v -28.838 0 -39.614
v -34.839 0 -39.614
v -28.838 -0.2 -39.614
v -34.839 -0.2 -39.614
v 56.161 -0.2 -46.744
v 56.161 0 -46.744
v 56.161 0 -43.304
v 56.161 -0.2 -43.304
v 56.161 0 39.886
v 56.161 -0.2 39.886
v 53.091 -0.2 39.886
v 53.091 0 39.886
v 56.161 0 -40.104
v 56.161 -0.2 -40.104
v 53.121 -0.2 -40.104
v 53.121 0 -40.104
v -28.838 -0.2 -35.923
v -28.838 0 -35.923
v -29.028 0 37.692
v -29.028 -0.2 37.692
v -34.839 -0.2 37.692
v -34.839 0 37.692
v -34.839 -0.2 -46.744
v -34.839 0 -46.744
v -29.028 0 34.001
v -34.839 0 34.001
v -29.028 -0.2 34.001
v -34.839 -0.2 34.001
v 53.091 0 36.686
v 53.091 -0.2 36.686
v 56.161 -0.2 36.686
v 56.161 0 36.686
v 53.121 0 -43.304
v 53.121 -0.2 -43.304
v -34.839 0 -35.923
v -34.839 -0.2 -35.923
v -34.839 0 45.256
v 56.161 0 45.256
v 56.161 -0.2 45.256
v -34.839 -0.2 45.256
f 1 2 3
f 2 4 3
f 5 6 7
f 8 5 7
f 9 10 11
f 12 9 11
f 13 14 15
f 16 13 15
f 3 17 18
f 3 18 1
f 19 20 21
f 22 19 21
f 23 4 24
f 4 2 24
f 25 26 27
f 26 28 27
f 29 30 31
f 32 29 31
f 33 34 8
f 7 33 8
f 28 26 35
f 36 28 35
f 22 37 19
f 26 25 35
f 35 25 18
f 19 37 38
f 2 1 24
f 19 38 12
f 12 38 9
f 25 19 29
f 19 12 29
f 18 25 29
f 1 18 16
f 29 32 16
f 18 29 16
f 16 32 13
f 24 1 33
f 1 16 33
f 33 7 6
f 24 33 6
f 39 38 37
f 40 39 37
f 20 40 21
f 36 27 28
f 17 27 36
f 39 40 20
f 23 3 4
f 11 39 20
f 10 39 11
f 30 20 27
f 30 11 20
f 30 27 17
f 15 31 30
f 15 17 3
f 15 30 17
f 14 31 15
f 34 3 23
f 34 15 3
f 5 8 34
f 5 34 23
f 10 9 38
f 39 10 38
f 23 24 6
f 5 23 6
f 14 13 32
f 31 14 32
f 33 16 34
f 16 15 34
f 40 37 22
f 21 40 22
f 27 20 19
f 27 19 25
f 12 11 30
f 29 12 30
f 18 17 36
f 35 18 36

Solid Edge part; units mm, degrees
sketch "Sketch1" plane through (12.1606, 0, 0.2565) normal (0, -1, 0) x (1, 0, 0)
  line L0 (-47, -47) -> (44, -47)
  line L1 (44, -47) -> (44, 45)
  line L2 (44, 45) -> (-47, 45)
  line L3 (-47, 45) -> (-47, -47)
  dimension "D1" = 91
  dimension "D2" = 92
extrude "ExtrudedProtrusion_1" add sketch "Sketch1" along normal blind 0.2
sketch "Sketch2" plane through (0, -0.2, 0) normal (0, -1, 0) x (1, 0, 0)
  circle A0 centre (-30.7894, -37.7535) radius 1.59
  circle A1 centre (54.6906, 38.2865) radius 1.59
  circle A2 centre (54.7206, -41.7035) radius 1.59
  circle A3 centre (-31.0894, 35.8465) radius 1.59
  dimension "D1" = 3.18
  dimension "D2" = 3.18
extrude "Cutout1" cut sketch "Sketch2" against normal up to next
sketch "Sketch3" plane through (10.6606, 0, -0.7435) normal (0, 1, 0) x (0, 0, 1)
  line L0 (-41.56, 42.46) -> (-42.56, 42.46)
  line L1 (-42.56, 42.46) -> (-42.56, 45.66)
  line L2 (-42.56, 45.66) -> (-39.36, 45.66)
  line L3 (-39.36, 45.66) -> (-39.36, 42.46)
  line L4 (-39.36, 42.46) -> (-41.56, 42.46)
extrude "ExtrudedCutout_2" cut sketch "Sketch3" along normal mid plane 12.4682
sketch "Sketch4" plane through (10.6606, 0, -0.7435) normal (0, 1, 0) x (0, 0, 1)
  line L0 (38.43, 42.43) -> (37.43, 42.43)
  line L1 (37.43, 42.43) -> (37.43, 45.63)
  line L2 (37.43, 45.63) -> (40.63, 45.63)
  line L3 (40.63, 45.63) -> (40.63, 42.43)
  line L4 (40.63, 42.43) -> (38.43, 42.43)
extrude "ExtrudedCutout_3" cut sketch "Sketch4" along normal mid plane 17.7174
sketch "Sketch5" plane through (10.6606, 0, -0.7435) normal (0, 1, 0) x (0, 0, -1)
  line L0 (-38.4354, 39.6883) -> (-38.4354, 46.3085)
  line L1 (-38.4354, 46.3085) -> (-34.7446, 46.3085)
  line L2 (-34.7446, 46.3085) -> (-34.7446, 39.6883)
  line L3 (-38.4354, 39.6883) -> (-34.7446, 39.6883)
  line L4 (35.1796, 39.4988) -> (35.1796, 45.5786)
  line L5 (35.1796, 45.5786) -> (38.8704, 45.5786)
  line L6 (38.8704, 45.5786) -> (38.8704, 39.4988)
  line L7 (35.1796, 39.4988) -> (38.8704, 39.4988)
extrude "ExtrudedCutout_4" cut sketch "Sketch5" along normal mid plane 21.0656
properties material "Copper"
